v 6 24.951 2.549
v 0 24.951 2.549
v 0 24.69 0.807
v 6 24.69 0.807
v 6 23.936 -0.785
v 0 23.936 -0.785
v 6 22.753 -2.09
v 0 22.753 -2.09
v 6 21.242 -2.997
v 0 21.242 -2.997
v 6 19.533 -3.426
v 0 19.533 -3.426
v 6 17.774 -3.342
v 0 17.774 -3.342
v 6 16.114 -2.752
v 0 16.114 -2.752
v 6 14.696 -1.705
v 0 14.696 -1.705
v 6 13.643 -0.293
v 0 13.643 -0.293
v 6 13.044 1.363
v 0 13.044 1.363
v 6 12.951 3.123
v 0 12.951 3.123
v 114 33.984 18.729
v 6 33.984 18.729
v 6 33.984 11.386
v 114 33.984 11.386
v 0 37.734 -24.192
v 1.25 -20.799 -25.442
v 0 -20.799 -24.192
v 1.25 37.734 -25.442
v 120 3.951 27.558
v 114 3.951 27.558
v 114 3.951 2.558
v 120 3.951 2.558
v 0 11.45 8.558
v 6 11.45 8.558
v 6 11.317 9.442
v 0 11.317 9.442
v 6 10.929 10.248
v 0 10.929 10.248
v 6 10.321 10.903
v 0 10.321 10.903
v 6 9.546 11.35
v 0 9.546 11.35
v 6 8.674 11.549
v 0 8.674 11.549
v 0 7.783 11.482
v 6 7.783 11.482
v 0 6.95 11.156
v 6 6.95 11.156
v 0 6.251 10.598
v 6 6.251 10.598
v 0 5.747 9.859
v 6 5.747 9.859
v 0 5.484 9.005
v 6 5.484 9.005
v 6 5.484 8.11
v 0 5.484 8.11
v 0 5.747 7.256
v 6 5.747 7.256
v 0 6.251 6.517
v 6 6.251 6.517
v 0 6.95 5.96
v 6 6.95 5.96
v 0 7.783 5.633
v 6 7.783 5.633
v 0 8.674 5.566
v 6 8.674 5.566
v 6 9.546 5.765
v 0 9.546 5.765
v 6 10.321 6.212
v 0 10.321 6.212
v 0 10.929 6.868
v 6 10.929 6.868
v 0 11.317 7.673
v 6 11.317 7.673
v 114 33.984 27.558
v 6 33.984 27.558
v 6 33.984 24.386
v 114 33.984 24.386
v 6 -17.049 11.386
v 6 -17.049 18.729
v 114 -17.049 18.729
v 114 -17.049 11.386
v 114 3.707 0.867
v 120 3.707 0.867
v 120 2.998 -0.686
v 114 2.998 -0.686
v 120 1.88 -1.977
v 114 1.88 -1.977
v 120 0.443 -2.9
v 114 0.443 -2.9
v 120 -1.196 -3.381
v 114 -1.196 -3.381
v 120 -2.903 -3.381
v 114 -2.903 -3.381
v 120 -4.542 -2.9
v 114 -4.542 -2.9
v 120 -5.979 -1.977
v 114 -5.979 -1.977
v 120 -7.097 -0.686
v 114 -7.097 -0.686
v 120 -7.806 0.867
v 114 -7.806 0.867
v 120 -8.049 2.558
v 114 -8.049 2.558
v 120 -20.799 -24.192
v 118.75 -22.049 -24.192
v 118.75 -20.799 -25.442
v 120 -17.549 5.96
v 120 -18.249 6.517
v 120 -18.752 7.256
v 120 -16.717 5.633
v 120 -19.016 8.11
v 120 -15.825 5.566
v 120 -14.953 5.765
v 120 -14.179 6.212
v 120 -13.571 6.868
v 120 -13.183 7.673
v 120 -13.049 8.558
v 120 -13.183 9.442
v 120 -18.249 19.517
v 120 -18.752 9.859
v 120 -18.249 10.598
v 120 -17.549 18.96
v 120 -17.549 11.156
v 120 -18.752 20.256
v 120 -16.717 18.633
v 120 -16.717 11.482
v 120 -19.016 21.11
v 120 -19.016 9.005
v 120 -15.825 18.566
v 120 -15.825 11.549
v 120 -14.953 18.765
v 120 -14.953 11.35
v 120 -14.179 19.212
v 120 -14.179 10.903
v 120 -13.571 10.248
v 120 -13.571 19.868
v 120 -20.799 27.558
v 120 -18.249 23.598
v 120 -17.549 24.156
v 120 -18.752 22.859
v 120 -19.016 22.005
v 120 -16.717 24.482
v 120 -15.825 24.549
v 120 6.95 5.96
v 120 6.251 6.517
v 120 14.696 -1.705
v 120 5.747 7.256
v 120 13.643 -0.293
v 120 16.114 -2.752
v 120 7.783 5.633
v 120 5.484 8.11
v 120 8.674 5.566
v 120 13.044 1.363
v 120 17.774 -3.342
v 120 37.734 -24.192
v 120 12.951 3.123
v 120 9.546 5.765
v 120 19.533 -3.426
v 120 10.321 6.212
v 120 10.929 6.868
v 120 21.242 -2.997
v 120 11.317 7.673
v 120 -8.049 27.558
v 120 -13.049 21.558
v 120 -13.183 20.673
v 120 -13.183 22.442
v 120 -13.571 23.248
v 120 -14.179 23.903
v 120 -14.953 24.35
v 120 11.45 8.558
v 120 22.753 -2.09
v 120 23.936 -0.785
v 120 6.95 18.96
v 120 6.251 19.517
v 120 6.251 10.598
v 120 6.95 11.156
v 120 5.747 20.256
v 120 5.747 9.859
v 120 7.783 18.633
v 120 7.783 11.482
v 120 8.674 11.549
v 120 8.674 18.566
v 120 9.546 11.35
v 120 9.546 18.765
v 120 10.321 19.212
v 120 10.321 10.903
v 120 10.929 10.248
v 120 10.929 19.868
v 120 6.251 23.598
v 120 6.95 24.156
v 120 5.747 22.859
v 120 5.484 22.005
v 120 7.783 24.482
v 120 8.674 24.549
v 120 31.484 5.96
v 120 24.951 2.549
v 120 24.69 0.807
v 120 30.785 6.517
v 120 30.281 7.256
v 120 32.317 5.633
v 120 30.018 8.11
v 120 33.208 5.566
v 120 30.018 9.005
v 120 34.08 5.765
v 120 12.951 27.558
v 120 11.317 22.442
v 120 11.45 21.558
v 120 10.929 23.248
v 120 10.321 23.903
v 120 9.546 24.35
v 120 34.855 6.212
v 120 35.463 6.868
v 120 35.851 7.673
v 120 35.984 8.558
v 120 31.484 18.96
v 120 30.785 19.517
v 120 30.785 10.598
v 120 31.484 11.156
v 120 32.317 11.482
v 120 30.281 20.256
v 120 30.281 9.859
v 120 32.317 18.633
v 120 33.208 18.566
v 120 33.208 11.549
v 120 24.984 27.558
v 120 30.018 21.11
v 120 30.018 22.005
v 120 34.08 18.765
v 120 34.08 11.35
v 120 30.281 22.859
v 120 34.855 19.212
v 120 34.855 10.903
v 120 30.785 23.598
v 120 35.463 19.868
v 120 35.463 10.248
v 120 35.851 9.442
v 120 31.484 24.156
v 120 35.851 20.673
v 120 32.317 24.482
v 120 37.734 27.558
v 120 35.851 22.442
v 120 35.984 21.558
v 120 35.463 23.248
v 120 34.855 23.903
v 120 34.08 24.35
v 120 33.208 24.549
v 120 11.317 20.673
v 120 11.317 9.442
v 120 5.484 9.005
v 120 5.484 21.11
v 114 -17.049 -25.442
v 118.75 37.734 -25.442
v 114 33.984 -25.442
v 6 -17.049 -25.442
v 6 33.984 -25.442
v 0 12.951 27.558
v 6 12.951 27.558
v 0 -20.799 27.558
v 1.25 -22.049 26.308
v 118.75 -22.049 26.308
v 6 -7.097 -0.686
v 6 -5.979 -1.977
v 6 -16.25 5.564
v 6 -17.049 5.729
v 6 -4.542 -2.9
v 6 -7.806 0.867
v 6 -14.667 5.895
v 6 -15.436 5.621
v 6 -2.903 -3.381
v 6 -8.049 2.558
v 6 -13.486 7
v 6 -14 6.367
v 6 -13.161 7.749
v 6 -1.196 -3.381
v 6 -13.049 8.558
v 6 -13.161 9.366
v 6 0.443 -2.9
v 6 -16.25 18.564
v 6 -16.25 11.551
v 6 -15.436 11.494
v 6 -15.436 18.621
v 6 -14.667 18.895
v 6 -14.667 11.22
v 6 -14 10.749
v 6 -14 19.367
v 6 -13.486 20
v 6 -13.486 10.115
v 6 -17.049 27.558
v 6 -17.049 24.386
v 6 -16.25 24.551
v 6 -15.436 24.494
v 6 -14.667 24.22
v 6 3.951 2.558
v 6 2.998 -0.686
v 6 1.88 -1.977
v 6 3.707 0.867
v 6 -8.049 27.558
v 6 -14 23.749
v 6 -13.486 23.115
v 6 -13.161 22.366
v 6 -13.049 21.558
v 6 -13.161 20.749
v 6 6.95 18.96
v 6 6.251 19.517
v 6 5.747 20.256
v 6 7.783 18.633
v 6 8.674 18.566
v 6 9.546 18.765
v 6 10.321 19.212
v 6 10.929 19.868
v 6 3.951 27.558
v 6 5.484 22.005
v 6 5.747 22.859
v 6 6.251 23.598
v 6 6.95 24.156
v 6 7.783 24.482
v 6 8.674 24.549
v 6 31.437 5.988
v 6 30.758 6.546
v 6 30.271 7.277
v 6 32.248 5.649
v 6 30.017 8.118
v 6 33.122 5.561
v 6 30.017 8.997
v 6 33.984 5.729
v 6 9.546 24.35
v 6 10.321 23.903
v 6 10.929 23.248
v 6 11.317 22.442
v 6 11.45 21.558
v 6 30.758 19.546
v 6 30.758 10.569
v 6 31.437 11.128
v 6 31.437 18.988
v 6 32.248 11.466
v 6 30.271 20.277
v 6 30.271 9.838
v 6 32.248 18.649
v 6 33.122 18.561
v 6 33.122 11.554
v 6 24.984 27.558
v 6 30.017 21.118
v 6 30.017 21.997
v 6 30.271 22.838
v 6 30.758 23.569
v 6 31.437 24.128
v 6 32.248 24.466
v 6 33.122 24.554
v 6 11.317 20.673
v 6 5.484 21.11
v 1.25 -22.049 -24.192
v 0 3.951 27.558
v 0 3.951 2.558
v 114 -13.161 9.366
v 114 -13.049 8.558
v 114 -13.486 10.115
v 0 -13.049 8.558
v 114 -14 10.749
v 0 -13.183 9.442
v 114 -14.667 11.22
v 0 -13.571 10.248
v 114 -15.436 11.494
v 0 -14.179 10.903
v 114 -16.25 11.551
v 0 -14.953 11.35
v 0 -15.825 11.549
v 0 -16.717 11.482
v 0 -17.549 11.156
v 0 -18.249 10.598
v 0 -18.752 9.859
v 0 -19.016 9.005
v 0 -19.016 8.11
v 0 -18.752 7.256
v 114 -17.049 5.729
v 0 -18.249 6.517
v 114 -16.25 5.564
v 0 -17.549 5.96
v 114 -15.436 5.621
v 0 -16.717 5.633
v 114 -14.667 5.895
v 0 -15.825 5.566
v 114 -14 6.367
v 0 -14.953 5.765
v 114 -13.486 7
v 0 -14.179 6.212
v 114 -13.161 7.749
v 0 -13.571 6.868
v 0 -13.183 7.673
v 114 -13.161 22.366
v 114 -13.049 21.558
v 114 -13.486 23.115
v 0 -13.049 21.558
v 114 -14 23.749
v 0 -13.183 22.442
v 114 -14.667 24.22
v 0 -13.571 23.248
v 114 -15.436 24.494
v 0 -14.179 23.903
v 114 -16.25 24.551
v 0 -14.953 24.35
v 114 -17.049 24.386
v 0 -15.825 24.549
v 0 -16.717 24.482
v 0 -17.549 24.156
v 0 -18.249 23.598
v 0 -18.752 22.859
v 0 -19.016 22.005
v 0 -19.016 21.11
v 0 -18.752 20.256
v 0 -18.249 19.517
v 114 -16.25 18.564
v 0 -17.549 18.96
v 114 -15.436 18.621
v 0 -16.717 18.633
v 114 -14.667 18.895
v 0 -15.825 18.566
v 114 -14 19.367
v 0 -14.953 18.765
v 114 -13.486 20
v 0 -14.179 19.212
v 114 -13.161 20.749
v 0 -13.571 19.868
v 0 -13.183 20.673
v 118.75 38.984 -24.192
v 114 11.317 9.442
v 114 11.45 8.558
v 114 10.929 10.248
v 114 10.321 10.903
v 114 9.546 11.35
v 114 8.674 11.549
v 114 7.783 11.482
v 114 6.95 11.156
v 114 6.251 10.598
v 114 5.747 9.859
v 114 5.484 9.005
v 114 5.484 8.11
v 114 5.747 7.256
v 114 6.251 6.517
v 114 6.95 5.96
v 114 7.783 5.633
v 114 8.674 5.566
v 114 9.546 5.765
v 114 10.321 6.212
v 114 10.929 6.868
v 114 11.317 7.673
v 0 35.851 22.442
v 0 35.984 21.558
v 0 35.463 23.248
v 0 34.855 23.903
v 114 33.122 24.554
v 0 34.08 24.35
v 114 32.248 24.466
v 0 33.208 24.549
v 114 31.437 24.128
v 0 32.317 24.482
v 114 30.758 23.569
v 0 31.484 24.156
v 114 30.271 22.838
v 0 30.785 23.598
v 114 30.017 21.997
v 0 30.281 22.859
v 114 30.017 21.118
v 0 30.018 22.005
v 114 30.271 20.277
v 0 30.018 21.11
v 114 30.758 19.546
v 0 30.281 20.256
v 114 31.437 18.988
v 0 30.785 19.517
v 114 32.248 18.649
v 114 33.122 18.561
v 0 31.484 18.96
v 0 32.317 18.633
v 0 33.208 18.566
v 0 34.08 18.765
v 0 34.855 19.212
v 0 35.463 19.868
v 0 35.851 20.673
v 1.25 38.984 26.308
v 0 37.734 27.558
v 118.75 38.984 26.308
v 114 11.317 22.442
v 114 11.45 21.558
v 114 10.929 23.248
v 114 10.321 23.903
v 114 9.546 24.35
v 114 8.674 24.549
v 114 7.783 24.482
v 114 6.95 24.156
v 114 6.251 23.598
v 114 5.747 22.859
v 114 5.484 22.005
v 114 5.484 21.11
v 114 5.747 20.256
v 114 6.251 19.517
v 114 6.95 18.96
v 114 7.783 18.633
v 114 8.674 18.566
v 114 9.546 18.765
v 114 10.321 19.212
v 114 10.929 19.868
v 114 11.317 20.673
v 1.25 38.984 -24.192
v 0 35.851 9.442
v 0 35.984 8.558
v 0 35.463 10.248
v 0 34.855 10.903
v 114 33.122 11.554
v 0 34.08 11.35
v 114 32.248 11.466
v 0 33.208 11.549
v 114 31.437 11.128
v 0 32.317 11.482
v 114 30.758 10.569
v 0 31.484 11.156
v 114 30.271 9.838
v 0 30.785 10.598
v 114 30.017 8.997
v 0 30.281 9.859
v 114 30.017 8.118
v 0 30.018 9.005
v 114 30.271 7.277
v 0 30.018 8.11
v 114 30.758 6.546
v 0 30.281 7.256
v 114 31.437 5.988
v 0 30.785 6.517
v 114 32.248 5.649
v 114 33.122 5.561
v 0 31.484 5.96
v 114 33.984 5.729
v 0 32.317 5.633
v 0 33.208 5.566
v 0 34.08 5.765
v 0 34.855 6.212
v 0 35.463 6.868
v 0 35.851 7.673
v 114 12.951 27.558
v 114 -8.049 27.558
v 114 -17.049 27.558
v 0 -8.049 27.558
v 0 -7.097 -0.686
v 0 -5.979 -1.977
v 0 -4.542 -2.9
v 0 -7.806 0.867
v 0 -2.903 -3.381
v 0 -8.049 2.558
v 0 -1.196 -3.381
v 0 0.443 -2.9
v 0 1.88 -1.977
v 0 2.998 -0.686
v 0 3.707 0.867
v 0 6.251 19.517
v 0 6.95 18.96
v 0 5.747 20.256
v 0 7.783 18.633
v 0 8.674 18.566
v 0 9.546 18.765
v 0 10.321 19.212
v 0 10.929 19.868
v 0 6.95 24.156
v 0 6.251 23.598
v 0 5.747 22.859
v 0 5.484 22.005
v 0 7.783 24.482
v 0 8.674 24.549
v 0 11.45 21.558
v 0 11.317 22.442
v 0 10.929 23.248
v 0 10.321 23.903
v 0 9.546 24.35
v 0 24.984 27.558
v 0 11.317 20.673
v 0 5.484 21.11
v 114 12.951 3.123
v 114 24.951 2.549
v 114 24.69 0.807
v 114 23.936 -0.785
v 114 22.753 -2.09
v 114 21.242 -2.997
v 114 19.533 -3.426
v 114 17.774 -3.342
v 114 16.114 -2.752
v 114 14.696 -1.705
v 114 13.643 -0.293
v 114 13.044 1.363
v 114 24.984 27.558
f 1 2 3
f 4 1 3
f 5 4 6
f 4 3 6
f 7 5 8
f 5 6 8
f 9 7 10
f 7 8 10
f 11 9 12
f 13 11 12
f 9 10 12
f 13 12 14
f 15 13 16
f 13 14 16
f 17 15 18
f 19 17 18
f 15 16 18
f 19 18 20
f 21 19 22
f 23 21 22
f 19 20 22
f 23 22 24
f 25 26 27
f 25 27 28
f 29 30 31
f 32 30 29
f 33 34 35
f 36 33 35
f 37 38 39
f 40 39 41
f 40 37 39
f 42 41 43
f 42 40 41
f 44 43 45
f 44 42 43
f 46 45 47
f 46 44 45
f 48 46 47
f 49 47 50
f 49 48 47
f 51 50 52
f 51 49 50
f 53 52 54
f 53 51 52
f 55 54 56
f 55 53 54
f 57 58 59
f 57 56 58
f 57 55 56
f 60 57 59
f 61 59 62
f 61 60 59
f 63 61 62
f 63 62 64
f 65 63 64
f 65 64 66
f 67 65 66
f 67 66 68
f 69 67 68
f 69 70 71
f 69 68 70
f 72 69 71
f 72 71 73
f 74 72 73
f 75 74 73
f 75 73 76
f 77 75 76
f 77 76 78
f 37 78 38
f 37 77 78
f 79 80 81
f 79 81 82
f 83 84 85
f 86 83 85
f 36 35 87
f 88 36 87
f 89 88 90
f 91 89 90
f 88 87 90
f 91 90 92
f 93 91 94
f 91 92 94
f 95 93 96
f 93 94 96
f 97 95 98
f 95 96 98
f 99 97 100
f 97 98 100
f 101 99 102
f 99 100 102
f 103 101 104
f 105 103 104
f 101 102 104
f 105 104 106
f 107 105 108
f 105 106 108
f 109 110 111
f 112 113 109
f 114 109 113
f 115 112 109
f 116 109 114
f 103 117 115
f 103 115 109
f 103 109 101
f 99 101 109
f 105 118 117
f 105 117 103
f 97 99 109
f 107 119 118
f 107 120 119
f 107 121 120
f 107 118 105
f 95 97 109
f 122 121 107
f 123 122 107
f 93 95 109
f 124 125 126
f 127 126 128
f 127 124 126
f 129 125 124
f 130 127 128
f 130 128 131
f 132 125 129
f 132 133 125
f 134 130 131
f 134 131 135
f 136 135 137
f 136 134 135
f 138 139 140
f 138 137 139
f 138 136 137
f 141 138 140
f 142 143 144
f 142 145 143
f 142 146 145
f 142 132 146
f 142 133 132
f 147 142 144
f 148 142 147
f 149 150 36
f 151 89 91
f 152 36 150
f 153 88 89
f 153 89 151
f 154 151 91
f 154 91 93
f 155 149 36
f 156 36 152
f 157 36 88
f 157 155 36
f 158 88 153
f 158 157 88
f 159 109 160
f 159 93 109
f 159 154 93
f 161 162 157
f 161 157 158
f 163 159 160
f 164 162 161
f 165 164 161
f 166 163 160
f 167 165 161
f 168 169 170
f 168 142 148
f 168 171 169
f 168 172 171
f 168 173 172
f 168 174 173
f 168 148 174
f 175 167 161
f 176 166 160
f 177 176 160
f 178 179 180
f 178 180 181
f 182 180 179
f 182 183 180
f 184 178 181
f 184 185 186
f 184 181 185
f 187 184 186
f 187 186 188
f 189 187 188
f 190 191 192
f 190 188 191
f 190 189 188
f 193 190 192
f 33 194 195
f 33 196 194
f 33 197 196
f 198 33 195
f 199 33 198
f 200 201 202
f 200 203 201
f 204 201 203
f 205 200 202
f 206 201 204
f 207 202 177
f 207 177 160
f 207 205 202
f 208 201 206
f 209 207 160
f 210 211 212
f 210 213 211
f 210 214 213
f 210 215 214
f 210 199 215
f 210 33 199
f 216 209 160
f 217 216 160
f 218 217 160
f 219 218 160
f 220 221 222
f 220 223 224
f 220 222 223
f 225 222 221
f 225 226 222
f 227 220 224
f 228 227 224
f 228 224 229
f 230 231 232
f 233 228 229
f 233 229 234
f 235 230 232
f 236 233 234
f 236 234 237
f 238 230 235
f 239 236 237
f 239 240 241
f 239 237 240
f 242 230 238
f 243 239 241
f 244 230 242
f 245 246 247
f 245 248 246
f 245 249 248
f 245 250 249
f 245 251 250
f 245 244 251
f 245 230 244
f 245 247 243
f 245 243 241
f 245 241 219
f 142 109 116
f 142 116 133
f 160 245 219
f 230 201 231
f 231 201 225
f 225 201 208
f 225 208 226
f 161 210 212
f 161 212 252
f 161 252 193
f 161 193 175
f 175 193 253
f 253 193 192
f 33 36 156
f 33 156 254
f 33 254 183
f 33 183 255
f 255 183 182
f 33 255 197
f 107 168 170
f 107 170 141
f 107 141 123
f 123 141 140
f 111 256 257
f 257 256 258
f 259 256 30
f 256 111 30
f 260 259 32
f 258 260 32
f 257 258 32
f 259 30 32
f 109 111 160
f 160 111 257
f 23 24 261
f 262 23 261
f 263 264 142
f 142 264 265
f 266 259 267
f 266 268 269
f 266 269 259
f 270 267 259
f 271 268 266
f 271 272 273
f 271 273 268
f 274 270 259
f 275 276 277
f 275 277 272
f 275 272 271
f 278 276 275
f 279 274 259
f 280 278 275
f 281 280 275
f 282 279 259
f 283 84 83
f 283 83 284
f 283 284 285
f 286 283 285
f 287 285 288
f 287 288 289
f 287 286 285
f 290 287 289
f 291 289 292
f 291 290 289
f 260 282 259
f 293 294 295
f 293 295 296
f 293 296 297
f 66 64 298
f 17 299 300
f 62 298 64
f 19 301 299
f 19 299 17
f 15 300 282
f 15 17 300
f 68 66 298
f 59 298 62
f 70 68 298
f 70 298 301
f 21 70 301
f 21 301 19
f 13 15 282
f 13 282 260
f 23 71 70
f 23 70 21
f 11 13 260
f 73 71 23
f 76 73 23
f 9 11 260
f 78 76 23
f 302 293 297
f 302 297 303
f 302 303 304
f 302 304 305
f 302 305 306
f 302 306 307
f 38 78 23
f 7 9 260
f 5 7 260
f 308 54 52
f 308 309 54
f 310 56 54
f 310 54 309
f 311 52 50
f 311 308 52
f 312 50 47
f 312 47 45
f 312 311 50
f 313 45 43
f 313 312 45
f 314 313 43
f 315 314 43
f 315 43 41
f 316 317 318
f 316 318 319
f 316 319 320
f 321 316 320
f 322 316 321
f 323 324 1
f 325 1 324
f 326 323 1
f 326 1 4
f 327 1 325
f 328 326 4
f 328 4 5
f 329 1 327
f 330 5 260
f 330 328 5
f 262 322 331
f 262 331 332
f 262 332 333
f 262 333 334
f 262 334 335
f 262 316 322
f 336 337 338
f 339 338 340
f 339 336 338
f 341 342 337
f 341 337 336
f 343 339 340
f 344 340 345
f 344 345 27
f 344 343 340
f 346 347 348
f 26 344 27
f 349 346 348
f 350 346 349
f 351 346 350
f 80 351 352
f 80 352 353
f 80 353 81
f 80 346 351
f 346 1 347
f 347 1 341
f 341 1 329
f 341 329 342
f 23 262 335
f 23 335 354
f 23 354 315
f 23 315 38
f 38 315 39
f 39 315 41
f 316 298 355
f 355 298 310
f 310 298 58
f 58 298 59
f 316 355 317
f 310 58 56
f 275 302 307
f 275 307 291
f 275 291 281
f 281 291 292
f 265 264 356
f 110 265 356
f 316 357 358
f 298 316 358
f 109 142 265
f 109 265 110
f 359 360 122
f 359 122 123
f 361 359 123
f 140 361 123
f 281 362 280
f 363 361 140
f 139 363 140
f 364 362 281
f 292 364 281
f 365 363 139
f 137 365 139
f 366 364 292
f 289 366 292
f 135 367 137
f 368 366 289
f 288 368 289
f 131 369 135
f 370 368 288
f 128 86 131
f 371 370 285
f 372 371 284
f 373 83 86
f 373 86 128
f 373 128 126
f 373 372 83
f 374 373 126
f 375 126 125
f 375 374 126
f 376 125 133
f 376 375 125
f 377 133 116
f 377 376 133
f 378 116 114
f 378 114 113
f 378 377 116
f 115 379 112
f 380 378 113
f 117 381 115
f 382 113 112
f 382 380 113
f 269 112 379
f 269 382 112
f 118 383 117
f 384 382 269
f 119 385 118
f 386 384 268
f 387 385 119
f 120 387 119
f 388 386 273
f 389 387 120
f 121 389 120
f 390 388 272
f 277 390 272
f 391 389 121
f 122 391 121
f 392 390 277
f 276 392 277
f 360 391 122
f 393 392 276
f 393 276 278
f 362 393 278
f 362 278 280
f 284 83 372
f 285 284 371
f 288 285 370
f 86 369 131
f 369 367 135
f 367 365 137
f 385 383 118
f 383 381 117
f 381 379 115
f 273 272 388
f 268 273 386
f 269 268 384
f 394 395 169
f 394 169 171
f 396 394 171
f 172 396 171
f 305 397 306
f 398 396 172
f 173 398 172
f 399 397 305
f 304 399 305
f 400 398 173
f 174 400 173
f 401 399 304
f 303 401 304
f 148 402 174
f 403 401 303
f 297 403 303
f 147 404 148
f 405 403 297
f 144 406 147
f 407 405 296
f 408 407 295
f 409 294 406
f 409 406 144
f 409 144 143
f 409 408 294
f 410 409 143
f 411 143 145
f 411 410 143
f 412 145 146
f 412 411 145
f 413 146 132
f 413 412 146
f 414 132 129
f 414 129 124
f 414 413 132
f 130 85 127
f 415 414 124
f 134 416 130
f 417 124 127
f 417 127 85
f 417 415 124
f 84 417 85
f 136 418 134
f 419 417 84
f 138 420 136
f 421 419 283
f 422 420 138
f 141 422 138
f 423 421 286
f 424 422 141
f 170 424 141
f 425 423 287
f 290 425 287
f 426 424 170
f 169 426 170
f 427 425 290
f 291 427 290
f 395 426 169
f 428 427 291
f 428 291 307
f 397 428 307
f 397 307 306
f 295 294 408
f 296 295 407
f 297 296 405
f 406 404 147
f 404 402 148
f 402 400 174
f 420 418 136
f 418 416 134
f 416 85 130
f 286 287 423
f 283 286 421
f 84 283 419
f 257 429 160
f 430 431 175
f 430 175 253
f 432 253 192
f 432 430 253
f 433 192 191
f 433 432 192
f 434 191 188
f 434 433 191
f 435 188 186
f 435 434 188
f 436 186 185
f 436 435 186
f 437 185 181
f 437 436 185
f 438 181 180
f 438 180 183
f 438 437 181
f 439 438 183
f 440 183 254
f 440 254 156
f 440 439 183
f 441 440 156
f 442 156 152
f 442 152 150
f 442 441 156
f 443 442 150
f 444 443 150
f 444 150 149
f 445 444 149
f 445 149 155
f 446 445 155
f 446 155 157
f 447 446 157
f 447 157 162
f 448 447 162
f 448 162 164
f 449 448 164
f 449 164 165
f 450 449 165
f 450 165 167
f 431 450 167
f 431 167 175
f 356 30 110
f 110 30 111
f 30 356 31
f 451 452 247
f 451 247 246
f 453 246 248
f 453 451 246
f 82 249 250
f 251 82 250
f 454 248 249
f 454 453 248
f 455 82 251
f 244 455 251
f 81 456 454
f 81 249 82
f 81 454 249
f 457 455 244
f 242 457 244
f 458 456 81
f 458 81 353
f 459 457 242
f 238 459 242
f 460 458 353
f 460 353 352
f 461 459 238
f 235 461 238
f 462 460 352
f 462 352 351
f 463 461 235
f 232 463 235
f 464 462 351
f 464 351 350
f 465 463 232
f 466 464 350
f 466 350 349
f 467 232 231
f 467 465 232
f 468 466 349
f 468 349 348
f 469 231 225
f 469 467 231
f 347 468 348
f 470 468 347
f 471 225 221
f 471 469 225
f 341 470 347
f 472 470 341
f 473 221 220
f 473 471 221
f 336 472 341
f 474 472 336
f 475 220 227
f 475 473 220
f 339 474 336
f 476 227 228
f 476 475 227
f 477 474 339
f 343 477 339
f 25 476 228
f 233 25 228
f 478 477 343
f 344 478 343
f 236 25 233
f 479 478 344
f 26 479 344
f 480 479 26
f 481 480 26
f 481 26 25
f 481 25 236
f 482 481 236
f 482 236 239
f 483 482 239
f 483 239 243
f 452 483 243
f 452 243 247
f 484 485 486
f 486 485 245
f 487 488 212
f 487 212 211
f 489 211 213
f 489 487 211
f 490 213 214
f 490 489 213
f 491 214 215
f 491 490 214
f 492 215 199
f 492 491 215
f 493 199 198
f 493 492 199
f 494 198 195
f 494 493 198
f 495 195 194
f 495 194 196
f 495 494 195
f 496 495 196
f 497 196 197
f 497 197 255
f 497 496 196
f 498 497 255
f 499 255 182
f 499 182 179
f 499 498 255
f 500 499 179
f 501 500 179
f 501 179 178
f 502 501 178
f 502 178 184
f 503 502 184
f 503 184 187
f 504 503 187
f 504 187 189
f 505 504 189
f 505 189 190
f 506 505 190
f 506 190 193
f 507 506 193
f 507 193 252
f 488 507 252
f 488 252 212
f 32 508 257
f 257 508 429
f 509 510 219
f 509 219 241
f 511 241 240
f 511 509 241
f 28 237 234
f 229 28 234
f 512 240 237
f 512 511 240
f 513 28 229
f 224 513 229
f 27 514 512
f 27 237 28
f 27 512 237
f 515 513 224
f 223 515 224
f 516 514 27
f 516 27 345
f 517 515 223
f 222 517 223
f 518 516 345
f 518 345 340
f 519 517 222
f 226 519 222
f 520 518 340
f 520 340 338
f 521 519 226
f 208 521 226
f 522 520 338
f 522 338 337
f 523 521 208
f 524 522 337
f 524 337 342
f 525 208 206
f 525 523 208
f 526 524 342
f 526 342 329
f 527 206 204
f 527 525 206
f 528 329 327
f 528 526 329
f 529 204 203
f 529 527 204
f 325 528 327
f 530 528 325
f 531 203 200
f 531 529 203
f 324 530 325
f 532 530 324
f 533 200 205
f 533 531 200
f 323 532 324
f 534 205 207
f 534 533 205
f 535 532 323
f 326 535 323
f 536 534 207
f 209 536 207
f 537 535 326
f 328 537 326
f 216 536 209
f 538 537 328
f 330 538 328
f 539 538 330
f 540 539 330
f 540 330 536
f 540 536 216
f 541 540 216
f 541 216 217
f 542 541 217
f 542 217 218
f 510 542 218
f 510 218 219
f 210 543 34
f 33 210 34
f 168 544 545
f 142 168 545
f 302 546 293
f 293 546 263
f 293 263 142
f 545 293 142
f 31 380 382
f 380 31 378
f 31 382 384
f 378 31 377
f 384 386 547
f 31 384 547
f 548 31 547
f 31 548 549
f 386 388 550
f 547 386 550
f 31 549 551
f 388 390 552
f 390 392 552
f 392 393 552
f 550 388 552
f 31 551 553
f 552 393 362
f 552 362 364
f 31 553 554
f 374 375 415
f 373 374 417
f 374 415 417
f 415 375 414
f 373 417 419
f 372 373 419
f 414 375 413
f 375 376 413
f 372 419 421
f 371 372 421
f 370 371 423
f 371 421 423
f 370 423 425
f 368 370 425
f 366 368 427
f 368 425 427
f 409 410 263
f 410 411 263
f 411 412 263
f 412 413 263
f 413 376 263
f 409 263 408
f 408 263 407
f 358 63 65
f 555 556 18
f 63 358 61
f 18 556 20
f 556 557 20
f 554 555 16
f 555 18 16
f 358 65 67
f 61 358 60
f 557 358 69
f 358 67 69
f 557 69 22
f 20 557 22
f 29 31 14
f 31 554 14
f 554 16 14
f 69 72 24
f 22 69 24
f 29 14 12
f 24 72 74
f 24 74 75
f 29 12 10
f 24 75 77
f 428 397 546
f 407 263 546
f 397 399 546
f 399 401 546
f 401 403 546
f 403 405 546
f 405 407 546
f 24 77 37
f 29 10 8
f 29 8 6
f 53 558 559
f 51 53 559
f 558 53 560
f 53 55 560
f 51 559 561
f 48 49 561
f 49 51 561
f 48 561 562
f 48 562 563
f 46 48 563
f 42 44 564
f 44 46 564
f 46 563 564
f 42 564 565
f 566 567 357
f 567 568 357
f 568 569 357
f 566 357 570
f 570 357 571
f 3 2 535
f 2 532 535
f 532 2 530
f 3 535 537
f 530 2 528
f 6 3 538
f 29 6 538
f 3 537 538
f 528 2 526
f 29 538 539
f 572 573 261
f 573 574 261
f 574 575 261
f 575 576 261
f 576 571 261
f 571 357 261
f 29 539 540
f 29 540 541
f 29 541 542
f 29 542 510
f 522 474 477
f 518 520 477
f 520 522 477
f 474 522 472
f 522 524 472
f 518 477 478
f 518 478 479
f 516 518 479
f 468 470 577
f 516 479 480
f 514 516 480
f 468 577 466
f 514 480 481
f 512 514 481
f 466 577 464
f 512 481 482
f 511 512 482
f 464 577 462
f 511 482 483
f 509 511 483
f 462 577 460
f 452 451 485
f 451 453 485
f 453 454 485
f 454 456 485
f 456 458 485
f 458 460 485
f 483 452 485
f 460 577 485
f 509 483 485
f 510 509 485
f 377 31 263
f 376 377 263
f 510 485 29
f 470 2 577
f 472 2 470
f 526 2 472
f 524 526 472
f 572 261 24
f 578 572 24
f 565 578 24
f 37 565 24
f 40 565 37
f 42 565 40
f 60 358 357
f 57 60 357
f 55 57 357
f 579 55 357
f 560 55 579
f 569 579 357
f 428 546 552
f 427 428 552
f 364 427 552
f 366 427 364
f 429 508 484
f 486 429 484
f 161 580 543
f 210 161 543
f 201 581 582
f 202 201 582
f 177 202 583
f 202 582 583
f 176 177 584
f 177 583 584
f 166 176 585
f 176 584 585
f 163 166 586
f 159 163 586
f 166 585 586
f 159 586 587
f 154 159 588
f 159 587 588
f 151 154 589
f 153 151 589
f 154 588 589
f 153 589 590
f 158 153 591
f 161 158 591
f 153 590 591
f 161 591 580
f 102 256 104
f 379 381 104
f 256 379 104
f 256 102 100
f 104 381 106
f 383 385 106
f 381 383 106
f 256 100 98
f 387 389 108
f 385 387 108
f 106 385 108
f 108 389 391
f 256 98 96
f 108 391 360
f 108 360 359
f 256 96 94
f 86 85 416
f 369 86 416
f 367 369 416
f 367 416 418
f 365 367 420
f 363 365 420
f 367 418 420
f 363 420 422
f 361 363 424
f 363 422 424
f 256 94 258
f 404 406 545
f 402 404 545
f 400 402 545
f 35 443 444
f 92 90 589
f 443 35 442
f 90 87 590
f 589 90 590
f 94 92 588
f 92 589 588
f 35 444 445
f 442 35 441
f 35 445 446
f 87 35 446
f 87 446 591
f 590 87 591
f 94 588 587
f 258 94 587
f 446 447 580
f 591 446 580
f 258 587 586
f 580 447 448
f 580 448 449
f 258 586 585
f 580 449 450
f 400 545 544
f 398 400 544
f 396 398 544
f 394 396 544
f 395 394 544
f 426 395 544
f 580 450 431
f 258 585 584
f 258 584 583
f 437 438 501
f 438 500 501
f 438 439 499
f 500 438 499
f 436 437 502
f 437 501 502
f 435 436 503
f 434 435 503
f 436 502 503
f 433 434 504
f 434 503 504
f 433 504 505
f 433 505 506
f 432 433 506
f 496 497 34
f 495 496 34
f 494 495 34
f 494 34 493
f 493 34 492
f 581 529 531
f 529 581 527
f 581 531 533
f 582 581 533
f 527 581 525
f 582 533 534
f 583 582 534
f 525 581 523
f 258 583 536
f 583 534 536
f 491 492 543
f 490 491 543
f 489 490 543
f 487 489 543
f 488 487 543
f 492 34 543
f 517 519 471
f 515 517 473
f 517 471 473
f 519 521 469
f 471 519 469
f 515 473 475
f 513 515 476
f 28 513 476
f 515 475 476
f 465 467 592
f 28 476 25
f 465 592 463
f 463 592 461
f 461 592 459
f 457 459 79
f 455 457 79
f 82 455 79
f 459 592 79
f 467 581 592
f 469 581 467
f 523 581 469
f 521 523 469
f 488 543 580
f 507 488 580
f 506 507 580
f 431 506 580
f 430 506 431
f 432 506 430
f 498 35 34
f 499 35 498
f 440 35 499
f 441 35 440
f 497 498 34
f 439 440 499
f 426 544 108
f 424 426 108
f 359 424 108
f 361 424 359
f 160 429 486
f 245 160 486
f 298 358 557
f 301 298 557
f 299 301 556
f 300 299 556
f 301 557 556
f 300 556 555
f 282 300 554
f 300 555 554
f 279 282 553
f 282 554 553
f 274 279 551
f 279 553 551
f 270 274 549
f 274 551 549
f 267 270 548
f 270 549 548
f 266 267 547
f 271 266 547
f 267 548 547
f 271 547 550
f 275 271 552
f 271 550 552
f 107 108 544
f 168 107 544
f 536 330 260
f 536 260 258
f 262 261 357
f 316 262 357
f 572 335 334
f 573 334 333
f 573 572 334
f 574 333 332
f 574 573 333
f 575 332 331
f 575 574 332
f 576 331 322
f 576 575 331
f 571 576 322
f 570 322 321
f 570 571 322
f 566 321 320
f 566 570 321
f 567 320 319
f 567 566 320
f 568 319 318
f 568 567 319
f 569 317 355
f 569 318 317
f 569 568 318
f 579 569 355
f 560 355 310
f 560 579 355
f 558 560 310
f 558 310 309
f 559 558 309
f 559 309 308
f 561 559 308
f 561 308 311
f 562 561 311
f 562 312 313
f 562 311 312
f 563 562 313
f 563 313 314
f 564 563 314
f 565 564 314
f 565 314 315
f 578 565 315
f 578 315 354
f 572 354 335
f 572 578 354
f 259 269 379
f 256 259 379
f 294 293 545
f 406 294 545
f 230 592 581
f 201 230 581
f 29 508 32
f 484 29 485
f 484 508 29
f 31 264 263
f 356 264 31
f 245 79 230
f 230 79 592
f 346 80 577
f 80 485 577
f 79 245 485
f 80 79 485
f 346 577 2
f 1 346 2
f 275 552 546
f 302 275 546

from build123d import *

# Parameters (mm, degrees)
F0_R     = 3
F1_DEPTH = 120
F2_W     = 108
F2_H     = 51.033765
F3_DEPTH = 80
F4_SIZE  = 1.25


with BuildPart() as f1:
    # F0 (on Right) → F1 (new body)
    with BuildSketch(Plane.YZ):
        with BuildLine():
            Line((-8.049497, 27.557599), (-22.049497, 27.557599))
            Line((-22.049497, 27.557599), (-22.049497, -25.442401))
            Line((-22.049497, -25.442401), (38.984268, -25.442401))
            Line((38.984268, -25.442401), (38.984268, 27.557599))
            Line((38.984268, 27.557599), (24.984268, 27.557599))
            Line((24.984268, 27.557599), (24.950503, 2.54948))
            ThreePointArc((24.950503, 2.54948), (18.650329, -3.448858), (12.950503, 3.122613))
            Line((12.950503, 3.122613), (12.950503, 27.557599))
            Line((12.950503, 27.557599), (3.950503, 27.557599))
            Line((3.950503, 27.557599), (3.950503, 2.557599))
            ThreePointArc((3.950503, 2.557599), (-2.049497, -3.442401), (-8.049497, 2.557599))
            Line((-8.049497, 2.557599), (-8.049497, 27.557599))
        make_face()
        with Locations((-16.049497, 8.557599)):
            Circle(F0_R, mode=Mode.SUBTRACT)
        with Locations((8.450268, 8.557599)):
            Circle(F0_R, mode=Mode.SUBTRACT)
        with Locations((-16.049497, 21.557599)):
            Circle(F0_R, mode=Mode.SUBTRACT)
        with Locations((8.450268, 21.557599)):
            Circle(F0_R, mode=Mode.SUBTRACT)
        with Locations((32.984268, 8.557599)):
            Circle(F0_R, mode=Mode.SUBTRACT)
        with Locations((32.984268, 21.557599)):
            Circle(F0_R, mode=Mode.SUBTRACT)
    extrude(amount=F1_DEPTH)

    # F2 (on face) → F3 (cut)
    with BuildSketch(Plane.XY.offset(27.557599)):
        with Locations((60, 8.467386)):
            Rectangle(F2_W, F2_H)
    extrude(amount=-F3_DEPTH, mode=Mode.SUBTRACT)

    # F4
    f4_edges = [f1.edges().sort_by_distance(p)[0] for p in [
        (0, 38.984268, 1.057599),
        (0, -22.049497, 1.057599),
        (60, -22.049497, 27.557599),
        (60, -22.049497, -25.442401),
        (120, -22.049497, 1.057599),
        (60, 38.984268, -25.442401),
        (60, 38.984268, 27.557599),
        (120, 38.984268, 1.057599),
        (120, 8.467386, -25.442401),
        (0, 8.467386, -25.442401),
    ]]
    chamfer(f4_edges, length=F4_SIZE)


solid = f1.part
